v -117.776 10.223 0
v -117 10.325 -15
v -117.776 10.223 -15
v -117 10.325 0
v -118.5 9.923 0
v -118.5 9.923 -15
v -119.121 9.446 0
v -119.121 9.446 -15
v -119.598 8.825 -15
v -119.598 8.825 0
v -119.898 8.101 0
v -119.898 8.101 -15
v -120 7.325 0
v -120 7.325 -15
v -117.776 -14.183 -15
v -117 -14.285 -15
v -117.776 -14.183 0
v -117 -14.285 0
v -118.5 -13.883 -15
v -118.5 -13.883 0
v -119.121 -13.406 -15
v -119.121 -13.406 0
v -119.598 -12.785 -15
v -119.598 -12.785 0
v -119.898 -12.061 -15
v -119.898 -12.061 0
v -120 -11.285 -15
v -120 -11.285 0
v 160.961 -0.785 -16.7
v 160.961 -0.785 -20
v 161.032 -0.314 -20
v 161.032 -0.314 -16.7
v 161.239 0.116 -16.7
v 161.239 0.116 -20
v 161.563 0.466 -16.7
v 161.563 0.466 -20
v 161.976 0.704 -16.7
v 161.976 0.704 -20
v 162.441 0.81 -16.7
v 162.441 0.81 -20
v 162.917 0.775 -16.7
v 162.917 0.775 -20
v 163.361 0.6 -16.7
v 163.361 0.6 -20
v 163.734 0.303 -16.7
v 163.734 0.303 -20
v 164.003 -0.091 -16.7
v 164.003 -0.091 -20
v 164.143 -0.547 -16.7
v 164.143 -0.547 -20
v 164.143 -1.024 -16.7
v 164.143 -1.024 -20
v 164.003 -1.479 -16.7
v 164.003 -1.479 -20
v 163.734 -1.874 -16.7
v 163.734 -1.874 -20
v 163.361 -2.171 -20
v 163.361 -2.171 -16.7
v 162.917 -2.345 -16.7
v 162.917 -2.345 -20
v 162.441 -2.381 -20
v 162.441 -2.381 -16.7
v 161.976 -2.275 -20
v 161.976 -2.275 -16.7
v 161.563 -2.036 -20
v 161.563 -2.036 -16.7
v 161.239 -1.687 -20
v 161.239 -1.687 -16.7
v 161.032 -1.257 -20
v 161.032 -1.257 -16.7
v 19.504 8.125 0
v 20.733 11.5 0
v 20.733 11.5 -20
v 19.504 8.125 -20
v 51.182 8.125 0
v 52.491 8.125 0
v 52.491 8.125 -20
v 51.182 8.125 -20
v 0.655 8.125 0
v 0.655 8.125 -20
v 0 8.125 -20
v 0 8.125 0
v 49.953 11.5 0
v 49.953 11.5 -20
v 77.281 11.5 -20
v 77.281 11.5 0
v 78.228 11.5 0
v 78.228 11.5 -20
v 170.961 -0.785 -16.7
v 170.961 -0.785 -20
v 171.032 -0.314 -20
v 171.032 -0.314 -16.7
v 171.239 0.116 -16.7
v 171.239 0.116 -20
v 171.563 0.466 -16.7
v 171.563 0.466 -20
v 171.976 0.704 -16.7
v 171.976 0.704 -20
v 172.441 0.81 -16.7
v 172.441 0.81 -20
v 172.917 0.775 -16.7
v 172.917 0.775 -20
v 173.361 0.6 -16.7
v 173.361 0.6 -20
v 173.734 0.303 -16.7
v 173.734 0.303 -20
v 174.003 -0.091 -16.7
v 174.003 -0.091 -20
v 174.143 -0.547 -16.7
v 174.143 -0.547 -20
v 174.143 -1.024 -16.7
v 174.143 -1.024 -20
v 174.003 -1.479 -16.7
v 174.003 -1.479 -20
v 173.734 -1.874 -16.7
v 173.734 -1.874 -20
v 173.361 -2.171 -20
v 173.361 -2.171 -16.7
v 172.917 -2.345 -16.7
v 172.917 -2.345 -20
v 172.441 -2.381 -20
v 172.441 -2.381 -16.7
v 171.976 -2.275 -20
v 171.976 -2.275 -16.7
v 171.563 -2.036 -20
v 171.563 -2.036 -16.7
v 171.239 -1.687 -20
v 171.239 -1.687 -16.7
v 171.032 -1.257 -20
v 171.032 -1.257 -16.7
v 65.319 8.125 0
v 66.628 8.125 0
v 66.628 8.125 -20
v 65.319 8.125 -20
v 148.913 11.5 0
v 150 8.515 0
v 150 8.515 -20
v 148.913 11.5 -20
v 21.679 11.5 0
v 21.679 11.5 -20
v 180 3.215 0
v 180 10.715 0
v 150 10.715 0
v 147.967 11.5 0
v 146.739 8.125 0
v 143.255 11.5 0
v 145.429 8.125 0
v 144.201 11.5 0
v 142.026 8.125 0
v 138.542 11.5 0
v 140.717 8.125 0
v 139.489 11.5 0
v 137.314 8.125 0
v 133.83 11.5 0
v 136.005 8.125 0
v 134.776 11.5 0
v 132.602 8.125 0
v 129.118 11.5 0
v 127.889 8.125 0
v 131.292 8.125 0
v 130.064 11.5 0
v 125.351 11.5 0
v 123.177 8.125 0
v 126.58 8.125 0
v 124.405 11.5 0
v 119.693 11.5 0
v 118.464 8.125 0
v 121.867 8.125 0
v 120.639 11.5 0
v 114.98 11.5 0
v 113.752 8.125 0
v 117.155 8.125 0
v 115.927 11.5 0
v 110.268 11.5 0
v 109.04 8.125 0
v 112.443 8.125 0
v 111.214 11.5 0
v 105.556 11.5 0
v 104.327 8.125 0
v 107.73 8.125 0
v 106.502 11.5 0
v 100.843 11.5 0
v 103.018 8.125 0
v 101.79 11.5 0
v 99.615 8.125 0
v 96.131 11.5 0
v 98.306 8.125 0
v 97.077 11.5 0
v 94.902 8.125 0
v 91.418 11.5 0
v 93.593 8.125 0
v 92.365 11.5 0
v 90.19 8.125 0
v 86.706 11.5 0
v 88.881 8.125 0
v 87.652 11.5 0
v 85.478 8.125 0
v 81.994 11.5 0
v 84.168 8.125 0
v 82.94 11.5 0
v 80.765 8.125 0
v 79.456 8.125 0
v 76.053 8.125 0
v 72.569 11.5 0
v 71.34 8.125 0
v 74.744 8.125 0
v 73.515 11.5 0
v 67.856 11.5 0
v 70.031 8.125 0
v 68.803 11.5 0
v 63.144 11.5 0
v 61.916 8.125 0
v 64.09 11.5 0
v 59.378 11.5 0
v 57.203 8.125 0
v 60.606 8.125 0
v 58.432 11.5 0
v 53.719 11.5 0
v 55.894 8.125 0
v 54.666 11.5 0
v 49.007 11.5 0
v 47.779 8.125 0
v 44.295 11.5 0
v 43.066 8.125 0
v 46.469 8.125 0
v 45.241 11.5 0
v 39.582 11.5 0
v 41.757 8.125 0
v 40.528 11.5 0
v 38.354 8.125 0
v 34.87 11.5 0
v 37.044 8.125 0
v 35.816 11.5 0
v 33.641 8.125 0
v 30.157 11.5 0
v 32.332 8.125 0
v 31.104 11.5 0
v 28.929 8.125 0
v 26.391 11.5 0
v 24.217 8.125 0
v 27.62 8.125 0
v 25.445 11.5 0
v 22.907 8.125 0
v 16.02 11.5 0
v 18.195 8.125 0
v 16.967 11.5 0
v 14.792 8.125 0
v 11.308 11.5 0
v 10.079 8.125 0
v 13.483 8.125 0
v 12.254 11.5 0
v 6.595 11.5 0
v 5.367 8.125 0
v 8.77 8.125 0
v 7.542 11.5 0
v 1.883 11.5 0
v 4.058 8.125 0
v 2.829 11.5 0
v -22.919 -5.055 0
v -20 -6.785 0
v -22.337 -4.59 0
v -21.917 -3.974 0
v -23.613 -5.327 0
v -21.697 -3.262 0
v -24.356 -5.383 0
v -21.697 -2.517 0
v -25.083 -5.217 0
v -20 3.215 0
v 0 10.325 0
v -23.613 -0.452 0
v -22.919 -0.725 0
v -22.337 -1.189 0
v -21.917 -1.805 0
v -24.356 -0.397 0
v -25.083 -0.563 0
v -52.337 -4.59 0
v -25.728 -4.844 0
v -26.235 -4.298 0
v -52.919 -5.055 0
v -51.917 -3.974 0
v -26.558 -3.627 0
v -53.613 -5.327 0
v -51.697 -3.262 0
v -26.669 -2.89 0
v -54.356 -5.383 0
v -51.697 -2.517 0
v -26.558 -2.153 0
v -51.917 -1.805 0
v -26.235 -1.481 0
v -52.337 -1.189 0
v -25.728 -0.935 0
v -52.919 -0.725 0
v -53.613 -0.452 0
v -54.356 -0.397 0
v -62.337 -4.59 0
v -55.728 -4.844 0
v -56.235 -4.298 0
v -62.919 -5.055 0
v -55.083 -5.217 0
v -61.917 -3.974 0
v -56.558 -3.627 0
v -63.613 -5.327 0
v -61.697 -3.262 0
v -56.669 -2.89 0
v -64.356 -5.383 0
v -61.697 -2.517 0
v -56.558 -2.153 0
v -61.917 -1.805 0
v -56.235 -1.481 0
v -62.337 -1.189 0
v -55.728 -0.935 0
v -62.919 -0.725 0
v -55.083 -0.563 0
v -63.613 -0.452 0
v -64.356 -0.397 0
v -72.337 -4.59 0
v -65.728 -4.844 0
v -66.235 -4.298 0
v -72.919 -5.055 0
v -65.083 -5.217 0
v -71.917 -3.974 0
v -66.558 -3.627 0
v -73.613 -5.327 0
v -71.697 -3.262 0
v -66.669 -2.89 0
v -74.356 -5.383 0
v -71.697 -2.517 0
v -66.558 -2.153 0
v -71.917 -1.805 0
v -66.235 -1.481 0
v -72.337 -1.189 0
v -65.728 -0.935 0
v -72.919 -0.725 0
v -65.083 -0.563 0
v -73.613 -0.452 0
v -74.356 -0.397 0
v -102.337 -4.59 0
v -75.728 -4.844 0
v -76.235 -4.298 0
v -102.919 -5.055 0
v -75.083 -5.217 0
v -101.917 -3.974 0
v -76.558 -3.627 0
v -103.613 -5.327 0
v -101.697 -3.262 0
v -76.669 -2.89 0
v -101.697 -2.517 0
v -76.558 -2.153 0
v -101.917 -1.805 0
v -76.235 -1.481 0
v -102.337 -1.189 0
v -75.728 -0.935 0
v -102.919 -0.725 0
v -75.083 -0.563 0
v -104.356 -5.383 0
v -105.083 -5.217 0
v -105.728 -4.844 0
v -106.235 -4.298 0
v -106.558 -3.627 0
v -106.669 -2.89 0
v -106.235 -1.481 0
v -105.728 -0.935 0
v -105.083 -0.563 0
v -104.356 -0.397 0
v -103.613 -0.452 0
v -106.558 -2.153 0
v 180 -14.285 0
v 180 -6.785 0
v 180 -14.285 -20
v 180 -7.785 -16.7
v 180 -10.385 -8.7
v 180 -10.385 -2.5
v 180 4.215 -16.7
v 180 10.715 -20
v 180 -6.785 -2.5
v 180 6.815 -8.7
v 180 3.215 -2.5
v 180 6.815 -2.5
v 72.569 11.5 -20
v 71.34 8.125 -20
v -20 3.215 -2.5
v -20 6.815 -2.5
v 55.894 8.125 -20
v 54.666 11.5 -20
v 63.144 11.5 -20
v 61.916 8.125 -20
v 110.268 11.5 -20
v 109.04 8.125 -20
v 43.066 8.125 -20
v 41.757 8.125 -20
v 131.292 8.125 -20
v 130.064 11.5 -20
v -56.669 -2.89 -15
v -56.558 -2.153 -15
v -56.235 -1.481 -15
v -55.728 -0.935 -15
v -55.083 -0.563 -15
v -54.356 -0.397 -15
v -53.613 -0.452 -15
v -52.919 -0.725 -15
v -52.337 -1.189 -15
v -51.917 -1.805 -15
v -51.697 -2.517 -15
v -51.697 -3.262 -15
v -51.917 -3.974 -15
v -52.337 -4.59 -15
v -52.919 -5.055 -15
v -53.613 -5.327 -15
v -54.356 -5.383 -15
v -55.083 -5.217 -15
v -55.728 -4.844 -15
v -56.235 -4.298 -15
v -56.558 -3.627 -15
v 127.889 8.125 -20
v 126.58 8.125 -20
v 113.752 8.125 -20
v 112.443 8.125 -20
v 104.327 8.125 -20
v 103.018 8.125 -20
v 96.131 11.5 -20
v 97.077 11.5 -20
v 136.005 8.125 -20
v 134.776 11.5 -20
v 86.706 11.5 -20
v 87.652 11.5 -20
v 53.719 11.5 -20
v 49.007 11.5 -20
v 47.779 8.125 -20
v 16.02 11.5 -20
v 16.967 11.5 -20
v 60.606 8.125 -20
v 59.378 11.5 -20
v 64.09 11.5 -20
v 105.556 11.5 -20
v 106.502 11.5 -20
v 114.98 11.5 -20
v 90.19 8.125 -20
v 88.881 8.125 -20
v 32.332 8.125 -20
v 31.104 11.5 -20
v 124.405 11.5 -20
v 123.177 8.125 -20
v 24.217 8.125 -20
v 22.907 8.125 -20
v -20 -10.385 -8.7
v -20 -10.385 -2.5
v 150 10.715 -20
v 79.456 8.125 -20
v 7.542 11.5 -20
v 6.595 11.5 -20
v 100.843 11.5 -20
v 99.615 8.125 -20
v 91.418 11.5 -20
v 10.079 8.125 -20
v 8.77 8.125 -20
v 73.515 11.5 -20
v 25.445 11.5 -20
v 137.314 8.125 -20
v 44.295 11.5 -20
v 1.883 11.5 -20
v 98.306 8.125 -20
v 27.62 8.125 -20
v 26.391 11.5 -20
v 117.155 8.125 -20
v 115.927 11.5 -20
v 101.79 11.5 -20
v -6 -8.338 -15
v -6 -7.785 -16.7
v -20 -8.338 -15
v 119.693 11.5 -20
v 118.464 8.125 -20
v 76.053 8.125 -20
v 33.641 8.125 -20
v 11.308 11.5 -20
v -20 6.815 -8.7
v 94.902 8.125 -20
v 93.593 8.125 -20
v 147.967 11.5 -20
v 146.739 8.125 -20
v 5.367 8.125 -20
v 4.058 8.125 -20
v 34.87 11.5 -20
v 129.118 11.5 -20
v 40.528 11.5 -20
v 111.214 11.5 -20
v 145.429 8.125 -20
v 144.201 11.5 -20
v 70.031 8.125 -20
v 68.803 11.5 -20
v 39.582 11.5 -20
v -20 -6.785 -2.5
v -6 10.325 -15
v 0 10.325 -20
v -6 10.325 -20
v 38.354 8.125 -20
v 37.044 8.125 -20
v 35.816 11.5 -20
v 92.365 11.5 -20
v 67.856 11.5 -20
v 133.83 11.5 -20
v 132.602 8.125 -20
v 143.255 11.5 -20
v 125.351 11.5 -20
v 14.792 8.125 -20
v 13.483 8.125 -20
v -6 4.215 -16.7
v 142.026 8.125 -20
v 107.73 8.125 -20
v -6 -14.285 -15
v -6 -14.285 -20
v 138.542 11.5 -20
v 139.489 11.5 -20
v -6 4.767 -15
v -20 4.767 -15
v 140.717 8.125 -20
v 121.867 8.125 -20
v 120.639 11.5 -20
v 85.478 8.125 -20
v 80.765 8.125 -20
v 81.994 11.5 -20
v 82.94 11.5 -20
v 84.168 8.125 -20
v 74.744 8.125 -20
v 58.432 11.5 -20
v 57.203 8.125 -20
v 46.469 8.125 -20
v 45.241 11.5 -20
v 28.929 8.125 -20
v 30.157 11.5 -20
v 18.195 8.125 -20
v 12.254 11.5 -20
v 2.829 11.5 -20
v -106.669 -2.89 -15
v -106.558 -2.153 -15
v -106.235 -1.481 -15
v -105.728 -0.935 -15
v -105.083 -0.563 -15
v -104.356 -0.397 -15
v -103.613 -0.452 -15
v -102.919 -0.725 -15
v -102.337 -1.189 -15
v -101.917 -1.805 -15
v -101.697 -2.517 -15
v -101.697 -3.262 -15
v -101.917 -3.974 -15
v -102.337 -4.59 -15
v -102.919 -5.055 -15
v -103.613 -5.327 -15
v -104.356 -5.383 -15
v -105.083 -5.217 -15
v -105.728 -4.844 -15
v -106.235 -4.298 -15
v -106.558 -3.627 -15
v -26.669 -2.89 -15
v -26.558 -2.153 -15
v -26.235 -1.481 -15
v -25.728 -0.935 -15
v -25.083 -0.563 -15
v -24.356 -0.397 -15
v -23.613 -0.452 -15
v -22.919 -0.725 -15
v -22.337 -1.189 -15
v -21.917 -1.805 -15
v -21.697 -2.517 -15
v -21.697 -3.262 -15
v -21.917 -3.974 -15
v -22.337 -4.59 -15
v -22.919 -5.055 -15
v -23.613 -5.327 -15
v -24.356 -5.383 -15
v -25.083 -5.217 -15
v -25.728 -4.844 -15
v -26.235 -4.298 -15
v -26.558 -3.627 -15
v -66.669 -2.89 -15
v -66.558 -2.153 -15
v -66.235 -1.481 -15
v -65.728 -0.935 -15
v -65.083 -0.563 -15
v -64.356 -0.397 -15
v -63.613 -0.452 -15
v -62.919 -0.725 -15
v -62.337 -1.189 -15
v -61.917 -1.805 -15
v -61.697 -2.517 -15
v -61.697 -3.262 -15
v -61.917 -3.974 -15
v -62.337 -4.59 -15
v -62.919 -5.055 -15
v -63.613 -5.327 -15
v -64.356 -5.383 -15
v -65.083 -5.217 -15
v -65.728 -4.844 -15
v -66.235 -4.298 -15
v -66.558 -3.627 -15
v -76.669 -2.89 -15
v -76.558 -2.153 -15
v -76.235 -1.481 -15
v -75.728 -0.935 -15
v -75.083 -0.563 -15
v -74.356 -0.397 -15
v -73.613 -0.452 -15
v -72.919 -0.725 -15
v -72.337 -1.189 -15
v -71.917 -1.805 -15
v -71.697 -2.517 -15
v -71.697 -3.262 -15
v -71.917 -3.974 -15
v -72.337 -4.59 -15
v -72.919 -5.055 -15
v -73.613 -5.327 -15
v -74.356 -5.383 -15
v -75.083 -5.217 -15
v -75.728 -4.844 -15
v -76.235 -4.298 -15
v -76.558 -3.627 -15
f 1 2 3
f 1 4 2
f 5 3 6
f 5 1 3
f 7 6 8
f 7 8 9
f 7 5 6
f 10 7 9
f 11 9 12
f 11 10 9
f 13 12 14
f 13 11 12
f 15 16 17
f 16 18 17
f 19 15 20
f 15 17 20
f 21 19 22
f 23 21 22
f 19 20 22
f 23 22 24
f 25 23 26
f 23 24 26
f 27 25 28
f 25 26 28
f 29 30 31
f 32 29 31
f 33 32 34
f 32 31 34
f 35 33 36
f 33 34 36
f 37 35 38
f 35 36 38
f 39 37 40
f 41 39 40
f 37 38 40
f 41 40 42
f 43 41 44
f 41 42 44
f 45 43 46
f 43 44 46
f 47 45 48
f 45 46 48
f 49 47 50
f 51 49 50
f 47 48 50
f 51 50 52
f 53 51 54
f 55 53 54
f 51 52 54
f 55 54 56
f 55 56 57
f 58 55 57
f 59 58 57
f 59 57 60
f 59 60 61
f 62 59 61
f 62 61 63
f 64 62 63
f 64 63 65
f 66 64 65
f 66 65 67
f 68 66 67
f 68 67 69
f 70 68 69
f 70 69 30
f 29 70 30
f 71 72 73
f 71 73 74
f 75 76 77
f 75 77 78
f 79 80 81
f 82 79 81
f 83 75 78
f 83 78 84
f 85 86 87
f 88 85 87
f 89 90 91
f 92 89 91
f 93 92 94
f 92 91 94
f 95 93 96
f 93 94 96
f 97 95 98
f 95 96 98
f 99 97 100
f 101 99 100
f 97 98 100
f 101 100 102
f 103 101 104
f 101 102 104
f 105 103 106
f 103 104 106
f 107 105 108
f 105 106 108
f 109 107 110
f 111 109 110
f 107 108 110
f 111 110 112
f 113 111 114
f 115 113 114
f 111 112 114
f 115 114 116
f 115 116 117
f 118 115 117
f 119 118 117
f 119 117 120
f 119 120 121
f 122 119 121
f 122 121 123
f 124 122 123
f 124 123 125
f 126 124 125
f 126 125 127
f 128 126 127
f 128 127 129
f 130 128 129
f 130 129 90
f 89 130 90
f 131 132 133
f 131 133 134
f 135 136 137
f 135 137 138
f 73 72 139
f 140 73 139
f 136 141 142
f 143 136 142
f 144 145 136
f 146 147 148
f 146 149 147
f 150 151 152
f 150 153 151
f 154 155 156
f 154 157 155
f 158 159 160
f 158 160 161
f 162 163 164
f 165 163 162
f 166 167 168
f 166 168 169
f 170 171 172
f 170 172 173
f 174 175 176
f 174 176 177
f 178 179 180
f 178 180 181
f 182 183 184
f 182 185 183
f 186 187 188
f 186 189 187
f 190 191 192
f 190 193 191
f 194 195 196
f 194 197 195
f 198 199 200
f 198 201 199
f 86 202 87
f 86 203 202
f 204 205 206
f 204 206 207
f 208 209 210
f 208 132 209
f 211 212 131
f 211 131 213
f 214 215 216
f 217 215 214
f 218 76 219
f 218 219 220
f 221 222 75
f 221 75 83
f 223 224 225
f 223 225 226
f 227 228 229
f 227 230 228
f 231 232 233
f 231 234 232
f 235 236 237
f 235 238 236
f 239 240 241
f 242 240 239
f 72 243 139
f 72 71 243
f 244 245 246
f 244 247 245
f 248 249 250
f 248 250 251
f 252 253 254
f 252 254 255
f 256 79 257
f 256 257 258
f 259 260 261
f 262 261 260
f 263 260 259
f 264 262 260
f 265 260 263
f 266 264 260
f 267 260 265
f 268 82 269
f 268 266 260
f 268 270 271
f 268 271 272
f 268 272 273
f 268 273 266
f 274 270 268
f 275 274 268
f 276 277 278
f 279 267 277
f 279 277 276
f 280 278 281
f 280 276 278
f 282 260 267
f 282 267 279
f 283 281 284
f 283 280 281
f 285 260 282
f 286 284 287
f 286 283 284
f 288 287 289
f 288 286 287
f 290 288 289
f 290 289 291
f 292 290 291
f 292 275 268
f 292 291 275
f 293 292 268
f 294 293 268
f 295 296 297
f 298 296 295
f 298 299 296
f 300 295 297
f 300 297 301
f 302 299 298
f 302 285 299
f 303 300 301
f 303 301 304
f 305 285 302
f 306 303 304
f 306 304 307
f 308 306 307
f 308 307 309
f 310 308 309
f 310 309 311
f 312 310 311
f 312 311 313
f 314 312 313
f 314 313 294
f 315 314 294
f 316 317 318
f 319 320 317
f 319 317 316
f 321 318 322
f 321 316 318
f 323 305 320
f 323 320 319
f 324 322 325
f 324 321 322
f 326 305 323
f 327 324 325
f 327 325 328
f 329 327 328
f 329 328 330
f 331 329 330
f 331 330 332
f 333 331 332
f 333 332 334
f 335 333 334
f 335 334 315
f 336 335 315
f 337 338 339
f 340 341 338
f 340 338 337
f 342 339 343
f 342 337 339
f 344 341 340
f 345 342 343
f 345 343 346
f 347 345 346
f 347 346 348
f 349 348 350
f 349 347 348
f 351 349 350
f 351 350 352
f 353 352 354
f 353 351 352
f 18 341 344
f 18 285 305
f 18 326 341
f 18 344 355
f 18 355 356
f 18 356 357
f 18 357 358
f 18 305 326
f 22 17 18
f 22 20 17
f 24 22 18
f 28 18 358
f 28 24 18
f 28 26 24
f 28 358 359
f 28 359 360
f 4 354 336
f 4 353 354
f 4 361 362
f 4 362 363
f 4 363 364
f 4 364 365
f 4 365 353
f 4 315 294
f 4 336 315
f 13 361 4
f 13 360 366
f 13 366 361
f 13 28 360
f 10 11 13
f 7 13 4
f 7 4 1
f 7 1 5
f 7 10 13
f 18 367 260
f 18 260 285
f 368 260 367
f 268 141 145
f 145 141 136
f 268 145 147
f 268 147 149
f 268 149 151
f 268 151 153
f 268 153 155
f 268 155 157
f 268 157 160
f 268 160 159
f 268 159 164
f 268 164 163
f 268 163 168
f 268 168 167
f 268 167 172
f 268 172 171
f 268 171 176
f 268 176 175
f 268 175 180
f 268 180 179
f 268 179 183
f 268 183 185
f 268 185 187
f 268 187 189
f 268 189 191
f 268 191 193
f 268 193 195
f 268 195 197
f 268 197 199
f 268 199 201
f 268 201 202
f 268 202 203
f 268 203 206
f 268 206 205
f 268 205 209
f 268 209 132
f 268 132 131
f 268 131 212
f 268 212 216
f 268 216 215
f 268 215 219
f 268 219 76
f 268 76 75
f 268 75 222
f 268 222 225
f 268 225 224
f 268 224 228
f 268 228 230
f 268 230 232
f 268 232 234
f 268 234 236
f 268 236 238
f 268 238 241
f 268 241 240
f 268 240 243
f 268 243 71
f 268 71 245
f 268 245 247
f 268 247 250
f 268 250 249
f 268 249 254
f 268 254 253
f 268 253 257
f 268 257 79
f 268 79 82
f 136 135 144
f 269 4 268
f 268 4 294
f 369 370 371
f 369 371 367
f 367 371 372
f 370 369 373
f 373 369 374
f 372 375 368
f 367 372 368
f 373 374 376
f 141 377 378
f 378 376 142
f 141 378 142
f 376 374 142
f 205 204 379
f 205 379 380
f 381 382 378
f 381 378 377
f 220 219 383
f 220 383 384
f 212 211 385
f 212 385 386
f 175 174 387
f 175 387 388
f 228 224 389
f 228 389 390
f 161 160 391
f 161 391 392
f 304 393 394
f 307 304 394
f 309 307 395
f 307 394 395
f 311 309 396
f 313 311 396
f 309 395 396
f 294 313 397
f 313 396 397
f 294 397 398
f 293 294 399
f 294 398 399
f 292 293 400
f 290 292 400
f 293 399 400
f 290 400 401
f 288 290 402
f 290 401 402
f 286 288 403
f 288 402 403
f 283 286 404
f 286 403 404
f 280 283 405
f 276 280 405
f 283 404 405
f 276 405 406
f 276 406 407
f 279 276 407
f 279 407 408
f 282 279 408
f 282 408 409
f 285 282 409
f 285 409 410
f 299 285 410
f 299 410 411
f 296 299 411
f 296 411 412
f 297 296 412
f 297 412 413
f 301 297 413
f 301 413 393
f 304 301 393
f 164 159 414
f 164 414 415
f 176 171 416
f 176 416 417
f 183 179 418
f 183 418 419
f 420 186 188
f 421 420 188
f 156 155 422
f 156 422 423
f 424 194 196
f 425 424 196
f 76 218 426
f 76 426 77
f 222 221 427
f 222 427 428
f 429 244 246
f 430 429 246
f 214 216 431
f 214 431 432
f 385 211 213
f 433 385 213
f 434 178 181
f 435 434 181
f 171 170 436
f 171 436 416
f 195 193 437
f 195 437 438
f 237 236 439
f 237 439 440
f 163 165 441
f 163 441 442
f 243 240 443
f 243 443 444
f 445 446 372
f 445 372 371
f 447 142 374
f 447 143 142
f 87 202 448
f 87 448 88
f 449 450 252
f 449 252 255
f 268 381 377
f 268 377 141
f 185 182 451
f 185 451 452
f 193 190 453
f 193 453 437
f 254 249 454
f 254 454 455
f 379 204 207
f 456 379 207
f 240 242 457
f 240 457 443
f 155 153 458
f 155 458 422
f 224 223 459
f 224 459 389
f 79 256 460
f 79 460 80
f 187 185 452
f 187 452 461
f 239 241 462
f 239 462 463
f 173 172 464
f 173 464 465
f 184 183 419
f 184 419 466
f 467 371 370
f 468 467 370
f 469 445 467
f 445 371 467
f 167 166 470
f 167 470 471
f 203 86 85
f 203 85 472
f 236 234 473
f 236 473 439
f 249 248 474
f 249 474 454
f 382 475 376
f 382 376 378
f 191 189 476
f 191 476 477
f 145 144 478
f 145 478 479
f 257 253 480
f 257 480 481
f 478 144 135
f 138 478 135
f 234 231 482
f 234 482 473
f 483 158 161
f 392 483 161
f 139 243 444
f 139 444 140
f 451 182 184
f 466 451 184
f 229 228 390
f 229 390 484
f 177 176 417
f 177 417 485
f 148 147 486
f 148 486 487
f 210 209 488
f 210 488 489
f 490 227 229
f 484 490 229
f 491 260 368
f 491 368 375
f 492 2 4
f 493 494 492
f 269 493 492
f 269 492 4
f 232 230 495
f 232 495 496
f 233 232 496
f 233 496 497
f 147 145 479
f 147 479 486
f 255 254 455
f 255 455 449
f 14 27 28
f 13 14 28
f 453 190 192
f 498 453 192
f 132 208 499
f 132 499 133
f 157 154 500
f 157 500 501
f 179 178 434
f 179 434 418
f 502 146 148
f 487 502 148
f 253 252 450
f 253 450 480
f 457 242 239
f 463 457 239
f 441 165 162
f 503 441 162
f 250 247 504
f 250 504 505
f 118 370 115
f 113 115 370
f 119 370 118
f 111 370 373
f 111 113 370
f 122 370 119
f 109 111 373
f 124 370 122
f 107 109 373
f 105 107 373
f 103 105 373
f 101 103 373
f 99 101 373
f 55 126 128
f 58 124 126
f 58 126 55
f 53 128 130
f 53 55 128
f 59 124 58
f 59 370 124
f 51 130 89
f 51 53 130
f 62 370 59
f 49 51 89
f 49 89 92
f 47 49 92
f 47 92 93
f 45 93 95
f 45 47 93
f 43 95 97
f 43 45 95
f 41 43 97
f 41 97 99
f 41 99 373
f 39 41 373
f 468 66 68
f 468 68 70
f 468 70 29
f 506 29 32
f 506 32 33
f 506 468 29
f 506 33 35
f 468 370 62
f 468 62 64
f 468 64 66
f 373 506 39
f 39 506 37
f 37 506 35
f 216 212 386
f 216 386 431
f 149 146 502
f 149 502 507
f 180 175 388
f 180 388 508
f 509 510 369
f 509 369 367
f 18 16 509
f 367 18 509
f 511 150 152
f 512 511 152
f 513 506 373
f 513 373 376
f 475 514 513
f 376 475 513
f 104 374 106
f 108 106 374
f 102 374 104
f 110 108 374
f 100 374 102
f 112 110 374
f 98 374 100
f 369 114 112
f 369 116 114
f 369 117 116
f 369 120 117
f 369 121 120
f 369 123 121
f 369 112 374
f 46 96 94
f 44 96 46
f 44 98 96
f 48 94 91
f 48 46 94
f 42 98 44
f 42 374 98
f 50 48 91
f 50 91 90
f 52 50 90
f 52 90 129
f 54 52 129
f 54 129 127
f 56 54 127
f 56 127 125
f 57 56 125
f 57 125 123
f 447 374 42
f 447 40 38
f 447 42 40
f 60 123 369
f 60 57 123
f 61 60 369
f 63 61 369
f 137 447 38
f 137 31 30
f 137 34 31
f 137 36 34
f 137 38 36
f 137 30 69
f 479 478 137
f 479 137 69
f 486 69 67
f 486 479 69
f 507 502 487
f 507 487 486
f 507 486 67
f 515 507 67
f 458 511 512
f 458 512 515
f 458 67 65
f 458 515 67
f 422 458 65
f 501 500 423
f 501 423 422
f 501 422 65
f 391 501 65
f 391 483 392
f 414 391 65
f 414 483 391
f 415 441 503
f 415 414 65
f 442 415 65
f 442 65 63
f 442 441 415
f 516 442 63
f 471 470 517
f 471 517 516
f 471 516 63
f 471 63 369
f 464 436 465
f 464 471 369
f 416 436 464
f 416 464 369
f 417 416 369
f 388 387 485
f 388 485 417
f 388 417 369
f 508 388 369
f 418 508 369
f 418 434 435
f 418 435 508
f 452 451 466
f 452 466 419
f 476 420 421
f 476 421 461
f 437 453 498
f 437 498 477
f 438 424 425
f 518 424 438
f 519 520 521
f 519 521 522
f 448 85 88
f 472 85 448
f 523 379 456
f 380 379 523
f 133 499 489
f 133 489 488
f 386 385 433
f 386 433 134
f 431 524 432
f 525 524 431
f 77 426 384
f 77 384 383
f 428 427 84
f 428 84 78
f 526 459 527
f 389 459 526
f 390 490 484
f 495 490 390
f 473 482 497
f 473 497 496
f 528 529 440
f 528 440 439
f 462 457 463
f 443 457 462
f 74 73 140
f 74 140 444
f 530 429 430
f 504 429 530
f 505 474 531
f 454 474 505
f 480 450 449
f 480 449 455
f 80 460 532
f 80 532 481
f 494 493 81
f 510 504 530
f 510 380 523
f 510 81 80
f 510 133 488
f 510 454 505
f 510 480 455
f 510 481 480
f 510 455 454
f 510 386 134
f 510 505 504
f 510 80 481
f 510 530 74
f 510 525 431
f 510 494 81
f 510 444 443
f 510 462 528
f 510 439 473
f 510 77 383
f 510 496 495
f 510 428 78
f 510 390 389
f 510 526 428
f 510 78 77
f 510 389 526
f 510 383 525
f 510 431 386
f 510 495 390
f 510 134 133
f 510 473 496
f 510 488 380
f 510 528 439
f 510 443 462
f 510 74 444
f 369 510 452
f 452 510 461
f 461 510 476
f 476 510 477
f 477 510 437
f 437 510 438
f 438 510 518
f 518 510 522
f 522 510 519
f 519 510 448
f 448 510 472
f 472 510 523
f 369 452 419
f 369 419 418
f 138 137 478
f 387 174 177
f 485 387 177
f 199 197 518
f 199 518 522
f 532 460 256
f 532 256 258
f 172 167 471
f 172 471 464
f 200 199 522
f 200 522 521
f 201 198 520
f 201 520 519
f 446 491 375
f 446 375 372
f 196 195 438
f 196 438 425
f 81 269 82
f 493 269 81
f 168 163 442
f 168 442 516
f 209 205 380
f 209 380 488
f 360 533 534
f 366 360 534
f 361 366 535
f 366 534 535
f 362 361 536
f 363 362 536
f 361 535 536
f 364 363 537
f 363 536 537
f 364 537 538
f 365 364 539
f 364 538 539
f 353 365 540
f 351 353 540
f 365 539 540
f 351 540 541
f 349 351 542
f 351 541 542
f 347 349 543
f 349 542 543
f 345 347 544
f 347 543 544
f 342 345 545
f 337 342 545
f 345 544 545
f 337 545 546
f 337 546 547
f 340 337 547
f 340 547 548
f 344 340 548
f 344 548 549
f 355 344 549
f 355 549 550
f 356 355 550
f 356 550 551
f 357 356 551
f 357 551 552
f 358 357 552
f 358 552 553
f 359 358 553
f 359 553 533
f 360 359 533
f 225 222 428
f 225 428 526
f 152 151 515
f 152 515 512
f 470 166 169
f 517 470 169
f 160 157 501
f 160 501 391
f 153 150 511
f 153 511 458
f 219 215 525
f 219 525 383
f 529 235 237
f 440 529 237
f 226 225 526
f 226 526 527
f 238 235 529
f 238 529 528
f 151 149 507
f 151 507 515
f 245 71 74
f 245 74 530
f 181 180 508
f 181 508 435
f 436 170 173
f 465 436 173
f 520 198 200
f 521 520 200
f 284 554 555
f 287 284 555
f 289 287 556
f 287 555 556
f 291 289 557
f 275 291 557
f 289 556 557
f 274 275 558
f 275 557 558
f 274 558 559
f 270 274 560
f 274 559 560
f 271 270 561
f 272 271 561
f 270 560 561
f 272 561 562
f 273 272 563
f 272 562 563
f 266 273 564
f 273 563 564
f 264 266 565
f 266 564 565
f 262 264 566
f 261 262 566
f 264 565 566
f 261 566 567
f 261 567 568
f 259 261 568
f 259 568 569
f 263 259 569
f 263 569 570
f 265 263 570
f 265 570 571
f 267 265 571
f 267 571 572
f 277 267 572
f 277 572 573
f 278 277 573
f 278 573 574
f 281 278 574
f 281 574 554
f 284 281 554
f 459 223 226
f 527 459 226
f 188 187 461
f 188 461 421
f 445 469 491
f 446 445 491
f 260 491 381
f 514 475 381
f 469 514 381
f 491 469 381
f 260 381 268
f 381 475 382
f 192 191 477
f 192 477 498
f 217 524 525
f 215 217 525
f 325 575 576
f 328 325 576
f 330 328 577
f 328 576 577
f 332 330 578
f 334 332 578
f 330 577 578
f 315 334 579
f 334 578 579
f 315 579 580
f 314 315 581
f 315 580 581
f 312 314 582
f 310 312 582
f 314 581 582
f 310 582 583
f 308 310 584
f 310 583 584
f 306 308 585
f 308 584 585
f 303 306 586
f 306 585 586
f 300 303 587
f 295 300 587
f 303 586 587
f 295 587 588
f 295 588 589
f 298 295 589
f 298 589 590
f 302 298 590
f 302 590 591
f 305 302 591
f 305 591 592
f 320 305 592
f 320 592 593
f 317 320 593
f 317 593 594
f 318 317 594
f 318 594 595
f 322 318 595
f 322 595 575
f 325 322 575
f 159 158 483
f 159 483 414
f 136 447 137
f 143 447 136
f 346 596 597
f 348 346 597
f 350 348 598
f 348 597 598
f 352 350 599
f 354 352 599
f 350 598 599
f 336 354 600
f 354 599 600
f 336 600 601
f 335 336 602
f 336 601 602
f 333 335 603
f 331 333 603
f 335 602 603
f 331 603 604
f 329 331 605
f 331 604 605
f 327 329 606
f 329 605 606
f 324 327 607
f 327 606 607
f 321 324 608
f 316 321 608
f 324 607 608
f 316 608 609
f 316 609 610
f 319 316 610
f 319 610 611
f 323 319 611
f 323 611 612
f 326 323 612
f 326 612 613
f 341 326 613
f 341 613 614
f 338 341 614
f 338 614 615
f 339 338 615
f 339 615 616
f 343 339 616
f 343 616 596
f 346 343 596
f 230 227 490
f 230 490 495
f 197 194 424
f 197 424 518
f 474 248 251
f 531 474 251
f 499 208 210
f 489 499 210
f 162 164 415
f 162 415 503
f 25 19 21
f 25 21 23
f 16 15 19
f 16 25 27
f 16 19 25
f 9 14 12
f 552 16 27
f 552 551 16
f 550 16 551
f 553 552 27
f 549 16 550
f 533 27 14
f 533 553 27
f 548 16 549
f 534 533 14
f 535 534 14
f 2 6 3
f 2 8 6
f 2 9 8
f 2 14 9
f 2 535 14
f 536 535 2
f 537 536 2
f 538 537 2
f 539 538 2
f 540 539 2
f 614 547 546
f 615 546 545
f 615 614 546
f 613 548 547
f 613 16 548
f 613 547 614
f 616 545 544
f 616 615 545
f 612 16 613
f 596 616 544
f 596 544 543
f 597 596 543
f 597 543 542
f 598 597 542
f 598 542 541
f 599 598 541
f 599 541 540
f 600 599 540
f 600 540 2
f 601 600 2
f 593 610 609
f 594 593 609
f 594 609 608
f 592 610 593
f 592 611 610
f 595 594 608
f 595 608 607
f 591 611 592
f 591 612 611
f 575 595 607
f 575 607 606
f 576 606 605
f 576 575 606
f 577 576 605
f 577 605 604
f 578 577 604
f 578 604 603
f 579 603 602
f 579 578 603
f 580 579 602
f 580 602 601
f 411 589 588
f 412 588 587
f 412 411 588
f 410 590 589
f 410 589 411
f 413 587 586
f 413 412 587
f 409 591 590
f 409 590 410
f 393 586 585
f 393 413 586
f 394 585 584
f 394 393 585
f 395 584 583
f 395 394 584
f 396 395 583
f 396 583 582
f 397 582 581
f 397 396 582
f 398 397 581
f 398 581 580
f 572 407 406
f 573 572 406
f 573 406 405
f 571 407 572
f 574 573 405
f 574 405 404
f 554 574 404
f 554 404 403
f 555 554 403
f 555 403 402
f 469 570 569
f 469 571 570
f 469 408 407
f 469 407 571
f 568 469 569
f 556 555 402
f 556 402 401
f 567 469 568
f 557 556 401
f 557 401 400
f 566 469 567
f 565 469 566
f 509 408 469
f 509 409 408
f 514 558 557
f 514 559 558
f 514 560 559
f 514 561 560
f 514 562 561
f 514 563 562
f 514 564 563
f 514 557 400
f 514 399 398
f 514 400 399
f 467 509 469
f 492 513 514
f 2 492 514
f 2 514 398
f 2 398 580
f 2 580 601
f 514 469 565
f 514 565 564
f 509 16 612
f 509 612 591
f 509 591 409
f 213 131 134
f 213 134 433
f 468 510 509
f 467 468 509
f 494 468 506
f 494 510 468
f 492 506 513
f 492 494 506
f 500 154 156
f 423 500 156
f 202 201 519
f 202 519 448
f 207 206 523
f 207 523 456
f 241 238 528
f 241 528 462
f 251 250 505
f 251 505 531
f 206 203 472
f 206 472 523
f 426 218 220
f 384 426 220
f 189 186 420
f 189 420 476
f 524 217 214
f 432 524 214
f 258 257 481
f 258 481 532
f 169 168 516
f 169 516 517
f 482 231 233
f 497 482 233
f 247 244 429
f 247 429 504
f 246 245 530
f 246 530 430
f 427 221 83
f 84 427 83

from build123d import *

# Parameters (mm, degrees)
BLANKSKE_W              = 150
BLANKSKE_H              = 11.5
BLANK_DEPTH             = 20
TOOTHCUTSIM_DEPTH       = 152.763796737
TEETHCUTS_COUNT         = 33
TEETHCUTS_PITCH         = 4.712388975
BOSS_EXTRUDE1_DEPTH     = 20
BOSS_EXTRUDE2_DEPTH     = 20
SKETCH3_W               = 190
SKETCH3_H               = 20
BOSS_EXTRUDE3_DEPTH     = 14.285
CUT_EXTRUDE1_DEPTH      = 192.583040024
SKETCH6_W               = 20
SKETCH6_H               = 24.61
BOSS_EXTRUDE4_DEPTH     = 140
BOSS_EXTRUDE5_DEPTH     = 10
SKETCH9_R               = 2.5
CUT_EXTRUDE2_DEPTH      = 182.670199056
CUT_EXTRUDE5_DEPTH      = 341.88716788
CUT_EXTRUDE5_DEPTH_BACK = 154
SKETCH15_W              = 2.5
SKETCH15_H              = 15
BOSS_EXTRUDE9_DEPTH     = 10
SKETCH16_R              = 2
CUT_EXTRUDE7_DEPTH      = 10
SKETCH17_W              = 15
SKETCH17_H              = 10
CUT_EXTRUDE8_DEPTH      = 177
SKETCH20_W              = 15
SKETCH20_H              = 24.61
CUT_EXTRUDE9_DEPTH      = 40
FILLET2_R               = 3
SKETCH21_R              = 1.6
CUT_EXTRUDE10_DEPTH     = 40


with BuildPart() as part:
    # BlankSke → Blank (new body)
    with BuildSketch(Plane.XY):
        with Locations((75, 5.75)):
            Rectangle(BLANKSKE_W, BLANKSKE_H)
    extrude(amount=-BLANK_DEPTH)

    # TooCutSkeSim → ToothCutSim (cut, through all)
    with BuildSketch(Plane.XY):
        Polygon((0.654653055, 8.125), (-0.654653055, 8.125), (-1.892297439, 11.5254), (1.892297439, 11.5254), align=None)
    toothcutsim = extrude(amount=-TOOTHCUTSIM_DEPTH, mode=Mode.SUBTRACT)

    # TeethCuts: ToothCutSim ×33
    with Locations(*[(i * TEETHCUTS_PITCH, 0, 0) for i in range(1, TEETHCUTS_COUNT)]):
        add(toothcutsim, mode=Mode.SUBTRACT)

    # Sketch1 → Boss-Extrude1 (add)
    with BuildSketch(Plane(origin=(150, 0, 0), x_dir=(0, 0, -1), z_dir=(1, 0, 0))):
        Polygon((0, 8.514576213), (0, 10.714576213), (20, 10.714576213), (20, 0), (0, 0), align=None)
    extrude(amount=BOSS_EXTRUDE1_DEPTH)

    # Sketch2 → Boss-Extrude2 (add)
    with BuildSketch(Plane.ZY):
        Polygon((-20, 8.125), (-20, 10.325), (0, 10.325), (0, 0), (-20, 0), align=None)
    extrude(amount=BOSS_EXTRUDE2_DEPTH)

    # Sketch3 → Boss-Extrude3 (add)
    with BuildSketch(Plane.XZ):
        with Locations((75, -10)):
            Rectangle(SKETCH3_W, SKETCH3_H)
    extrude(amount=BOSS_EXTRUDE3_DEPTH)

    # Sketch4 → Cut-Extrude1 (cut, through all)
    with BuildSketch(Plane(origin=(170, 0, 0), x_dir=(0, 0, -1), z_dir=(1, 0, 0))):
        Polygon((2.5, -6.785211894), (2.5, -10.385211894), (8.7, -10.385211894), (16.7, -7.785211894), (16.7, -1.785211894), (16.7, 4.214788106), (8.7, 6.814788106), (2.5, 6.814788106), (2.5, 3.214788106), (0, 3.214788106), (0, -1.785211894), (0, -6.785211894), align=None)
    extrude(amount=-CUT_EXTRUDE1_DEPTH, mode=Mode.SUBTRACT)

    # Sketch6 → Boss-Extrude4 (add)
    with BuildSketch(Plane.ZY.offset(20)):
        with Locations((-10, -1.98)):
            Rectangle(SKETCH6_W, SKETCH6_H)
    extrude(amount=BOSS_EXTRUDE4_DEPTH)

    # Sketch8 → Boss-Extrude5 (add)
    with BuildSketch(Plane(origin=(170, 0, 0), x_dir=(0, 0, -1), z_dir=(1, 0, 0))):
        Polygon((20, 10.714576213), (20, -14.285), (0, -14.285), (0, -6.785211894), (2.5, -6.785211894), (2.5, -10.385211894), (8.7, -10.385211894), (16.7, -7.785211894), (16.7, 4.214788106), (8.7, 6.814788106), (2.5, 6.814788106), (2.5, 3.214788106), (0, 3.214788106), (0, 10.714576213), align=None)
    extrude(amount=BOSS_EXTRUDE5_DEPTH)

    # Sketch9 → Cut-Extrude2 (cut, through all)
    with BuildSketch(Plane(origin=(0, 0, -20), x_dir=(-1, 0, 0), z_dir=(0, 0, -1))):
        with Locations((24.169323408, -2.889762756)):
            Circle(SKETCH9_R)
        with Locations((54.169323408, -2.889762756)):
            Circle(SKETCH9_R)
        with Locations((64.169323408, -2.889762756)):
            Circle(SKETCH9_R)
        with Locations((74.169323408, -2.889762756)):
            Circle(SKETCH9_R)
        with Locations((104.169323408, -2.889762756)):
            Circle(SKETCH9_R)
    extrude(amount=-CUT_EXTRUDE2_DEPTH, mode=Mode.SUBTRACT)

    # Sketch10 → Cut-Extrude5 (cut, two sides: drawn at the far end of the back side and taken through both)
    with BuildSketch(Plane.ZY.offset(160).offset(-CUT_EXTRUDE5_DEPTH_BACK)):
        Polygon((-20, -14.285), (-15, -14.285), (-15, 10.325), (-15, 11.5), (-20, 11.5), (-20, 10.325), align=None)
    extrude(amount=CUT_EXTRUDE5_DEPTH + CUT_EXTRUDE5_DEPTH_BACK, mode=Mode.SUBTRACT)

    # Sketch15 → Boss-Extrude9 (add)
    with BuildSketch(Plane.XZ.offset(14.285)):
        with Locations((-11.17642258, -7.5)):
            Rectangle(SKETCH15_W, SKETCH15_H)
    extrude(amount=BOSS_EXTRUDE9_DEPTH)

    # Sketch16 → Cut-Extrude7 (cut)
    with BuildSketch(Plane.ZY.offset(12.42642258)):
        with Locations((-11.25, -19.285)):
            Circle(SKETCH16_R)
        with Locations((-3.75, -19.285)):
            Circle(SKETCH16_R)
    extrude(amount=-CUT_EXTRUDE7_DEPTH, mode=Mode.SUBTRACT)

    # Sketch17 → Cut-Extrude8 (cut)
    with BuildSketch(Plane.ZY.offset(160)):
        with Locations((-7.5, -19.285)):
            Rectangle(SKETCH17_W, SKETCH17_H)
    extrude(amount=-CUT_EXTRUDE8_DEPTH, mode=Mode.SUBTRACT)

    # Sketch20 → Cut-Extrude9 (cut)
    with BuildSketch(Plane.ZY.offset(160)):
        with Locations((-7.5, -1.98)):
            Rectangle(SKETCH20_W, SKETCH20_H)
    extrude(amount=-CUT_EXTRUDE9_DEPTH, mode=Mode.SUBTRACT)

    # Fillet2
    fillet2_edges = [part.edges().sort_by_distance(p)[0] for p in [
        (-120, -14.285, -7.5),
        (-120, 10.325, -7.5),
    ]]
    fillet(fillet2_edges, radius=FILLET2_R)

    # Sketch21 → Cut-Extrude10 (cut)
    with BuildSketch(Plane(origin=(0, 0, -20), x_dir=(-1, 0, 0), z_dir=(0, 0, -1))):
        with Locations((-172.560963077, -0.785239005)):
            Circle(SKETCH21_R)
        with Locations((-162.560967794, -0.785233109)):
            Circle(SKETCH21_R)
    extrude(amount=-CUT_EXTRUDE10_DEPTH, mode=Mode.SUBTRACT)


solid = part.part
